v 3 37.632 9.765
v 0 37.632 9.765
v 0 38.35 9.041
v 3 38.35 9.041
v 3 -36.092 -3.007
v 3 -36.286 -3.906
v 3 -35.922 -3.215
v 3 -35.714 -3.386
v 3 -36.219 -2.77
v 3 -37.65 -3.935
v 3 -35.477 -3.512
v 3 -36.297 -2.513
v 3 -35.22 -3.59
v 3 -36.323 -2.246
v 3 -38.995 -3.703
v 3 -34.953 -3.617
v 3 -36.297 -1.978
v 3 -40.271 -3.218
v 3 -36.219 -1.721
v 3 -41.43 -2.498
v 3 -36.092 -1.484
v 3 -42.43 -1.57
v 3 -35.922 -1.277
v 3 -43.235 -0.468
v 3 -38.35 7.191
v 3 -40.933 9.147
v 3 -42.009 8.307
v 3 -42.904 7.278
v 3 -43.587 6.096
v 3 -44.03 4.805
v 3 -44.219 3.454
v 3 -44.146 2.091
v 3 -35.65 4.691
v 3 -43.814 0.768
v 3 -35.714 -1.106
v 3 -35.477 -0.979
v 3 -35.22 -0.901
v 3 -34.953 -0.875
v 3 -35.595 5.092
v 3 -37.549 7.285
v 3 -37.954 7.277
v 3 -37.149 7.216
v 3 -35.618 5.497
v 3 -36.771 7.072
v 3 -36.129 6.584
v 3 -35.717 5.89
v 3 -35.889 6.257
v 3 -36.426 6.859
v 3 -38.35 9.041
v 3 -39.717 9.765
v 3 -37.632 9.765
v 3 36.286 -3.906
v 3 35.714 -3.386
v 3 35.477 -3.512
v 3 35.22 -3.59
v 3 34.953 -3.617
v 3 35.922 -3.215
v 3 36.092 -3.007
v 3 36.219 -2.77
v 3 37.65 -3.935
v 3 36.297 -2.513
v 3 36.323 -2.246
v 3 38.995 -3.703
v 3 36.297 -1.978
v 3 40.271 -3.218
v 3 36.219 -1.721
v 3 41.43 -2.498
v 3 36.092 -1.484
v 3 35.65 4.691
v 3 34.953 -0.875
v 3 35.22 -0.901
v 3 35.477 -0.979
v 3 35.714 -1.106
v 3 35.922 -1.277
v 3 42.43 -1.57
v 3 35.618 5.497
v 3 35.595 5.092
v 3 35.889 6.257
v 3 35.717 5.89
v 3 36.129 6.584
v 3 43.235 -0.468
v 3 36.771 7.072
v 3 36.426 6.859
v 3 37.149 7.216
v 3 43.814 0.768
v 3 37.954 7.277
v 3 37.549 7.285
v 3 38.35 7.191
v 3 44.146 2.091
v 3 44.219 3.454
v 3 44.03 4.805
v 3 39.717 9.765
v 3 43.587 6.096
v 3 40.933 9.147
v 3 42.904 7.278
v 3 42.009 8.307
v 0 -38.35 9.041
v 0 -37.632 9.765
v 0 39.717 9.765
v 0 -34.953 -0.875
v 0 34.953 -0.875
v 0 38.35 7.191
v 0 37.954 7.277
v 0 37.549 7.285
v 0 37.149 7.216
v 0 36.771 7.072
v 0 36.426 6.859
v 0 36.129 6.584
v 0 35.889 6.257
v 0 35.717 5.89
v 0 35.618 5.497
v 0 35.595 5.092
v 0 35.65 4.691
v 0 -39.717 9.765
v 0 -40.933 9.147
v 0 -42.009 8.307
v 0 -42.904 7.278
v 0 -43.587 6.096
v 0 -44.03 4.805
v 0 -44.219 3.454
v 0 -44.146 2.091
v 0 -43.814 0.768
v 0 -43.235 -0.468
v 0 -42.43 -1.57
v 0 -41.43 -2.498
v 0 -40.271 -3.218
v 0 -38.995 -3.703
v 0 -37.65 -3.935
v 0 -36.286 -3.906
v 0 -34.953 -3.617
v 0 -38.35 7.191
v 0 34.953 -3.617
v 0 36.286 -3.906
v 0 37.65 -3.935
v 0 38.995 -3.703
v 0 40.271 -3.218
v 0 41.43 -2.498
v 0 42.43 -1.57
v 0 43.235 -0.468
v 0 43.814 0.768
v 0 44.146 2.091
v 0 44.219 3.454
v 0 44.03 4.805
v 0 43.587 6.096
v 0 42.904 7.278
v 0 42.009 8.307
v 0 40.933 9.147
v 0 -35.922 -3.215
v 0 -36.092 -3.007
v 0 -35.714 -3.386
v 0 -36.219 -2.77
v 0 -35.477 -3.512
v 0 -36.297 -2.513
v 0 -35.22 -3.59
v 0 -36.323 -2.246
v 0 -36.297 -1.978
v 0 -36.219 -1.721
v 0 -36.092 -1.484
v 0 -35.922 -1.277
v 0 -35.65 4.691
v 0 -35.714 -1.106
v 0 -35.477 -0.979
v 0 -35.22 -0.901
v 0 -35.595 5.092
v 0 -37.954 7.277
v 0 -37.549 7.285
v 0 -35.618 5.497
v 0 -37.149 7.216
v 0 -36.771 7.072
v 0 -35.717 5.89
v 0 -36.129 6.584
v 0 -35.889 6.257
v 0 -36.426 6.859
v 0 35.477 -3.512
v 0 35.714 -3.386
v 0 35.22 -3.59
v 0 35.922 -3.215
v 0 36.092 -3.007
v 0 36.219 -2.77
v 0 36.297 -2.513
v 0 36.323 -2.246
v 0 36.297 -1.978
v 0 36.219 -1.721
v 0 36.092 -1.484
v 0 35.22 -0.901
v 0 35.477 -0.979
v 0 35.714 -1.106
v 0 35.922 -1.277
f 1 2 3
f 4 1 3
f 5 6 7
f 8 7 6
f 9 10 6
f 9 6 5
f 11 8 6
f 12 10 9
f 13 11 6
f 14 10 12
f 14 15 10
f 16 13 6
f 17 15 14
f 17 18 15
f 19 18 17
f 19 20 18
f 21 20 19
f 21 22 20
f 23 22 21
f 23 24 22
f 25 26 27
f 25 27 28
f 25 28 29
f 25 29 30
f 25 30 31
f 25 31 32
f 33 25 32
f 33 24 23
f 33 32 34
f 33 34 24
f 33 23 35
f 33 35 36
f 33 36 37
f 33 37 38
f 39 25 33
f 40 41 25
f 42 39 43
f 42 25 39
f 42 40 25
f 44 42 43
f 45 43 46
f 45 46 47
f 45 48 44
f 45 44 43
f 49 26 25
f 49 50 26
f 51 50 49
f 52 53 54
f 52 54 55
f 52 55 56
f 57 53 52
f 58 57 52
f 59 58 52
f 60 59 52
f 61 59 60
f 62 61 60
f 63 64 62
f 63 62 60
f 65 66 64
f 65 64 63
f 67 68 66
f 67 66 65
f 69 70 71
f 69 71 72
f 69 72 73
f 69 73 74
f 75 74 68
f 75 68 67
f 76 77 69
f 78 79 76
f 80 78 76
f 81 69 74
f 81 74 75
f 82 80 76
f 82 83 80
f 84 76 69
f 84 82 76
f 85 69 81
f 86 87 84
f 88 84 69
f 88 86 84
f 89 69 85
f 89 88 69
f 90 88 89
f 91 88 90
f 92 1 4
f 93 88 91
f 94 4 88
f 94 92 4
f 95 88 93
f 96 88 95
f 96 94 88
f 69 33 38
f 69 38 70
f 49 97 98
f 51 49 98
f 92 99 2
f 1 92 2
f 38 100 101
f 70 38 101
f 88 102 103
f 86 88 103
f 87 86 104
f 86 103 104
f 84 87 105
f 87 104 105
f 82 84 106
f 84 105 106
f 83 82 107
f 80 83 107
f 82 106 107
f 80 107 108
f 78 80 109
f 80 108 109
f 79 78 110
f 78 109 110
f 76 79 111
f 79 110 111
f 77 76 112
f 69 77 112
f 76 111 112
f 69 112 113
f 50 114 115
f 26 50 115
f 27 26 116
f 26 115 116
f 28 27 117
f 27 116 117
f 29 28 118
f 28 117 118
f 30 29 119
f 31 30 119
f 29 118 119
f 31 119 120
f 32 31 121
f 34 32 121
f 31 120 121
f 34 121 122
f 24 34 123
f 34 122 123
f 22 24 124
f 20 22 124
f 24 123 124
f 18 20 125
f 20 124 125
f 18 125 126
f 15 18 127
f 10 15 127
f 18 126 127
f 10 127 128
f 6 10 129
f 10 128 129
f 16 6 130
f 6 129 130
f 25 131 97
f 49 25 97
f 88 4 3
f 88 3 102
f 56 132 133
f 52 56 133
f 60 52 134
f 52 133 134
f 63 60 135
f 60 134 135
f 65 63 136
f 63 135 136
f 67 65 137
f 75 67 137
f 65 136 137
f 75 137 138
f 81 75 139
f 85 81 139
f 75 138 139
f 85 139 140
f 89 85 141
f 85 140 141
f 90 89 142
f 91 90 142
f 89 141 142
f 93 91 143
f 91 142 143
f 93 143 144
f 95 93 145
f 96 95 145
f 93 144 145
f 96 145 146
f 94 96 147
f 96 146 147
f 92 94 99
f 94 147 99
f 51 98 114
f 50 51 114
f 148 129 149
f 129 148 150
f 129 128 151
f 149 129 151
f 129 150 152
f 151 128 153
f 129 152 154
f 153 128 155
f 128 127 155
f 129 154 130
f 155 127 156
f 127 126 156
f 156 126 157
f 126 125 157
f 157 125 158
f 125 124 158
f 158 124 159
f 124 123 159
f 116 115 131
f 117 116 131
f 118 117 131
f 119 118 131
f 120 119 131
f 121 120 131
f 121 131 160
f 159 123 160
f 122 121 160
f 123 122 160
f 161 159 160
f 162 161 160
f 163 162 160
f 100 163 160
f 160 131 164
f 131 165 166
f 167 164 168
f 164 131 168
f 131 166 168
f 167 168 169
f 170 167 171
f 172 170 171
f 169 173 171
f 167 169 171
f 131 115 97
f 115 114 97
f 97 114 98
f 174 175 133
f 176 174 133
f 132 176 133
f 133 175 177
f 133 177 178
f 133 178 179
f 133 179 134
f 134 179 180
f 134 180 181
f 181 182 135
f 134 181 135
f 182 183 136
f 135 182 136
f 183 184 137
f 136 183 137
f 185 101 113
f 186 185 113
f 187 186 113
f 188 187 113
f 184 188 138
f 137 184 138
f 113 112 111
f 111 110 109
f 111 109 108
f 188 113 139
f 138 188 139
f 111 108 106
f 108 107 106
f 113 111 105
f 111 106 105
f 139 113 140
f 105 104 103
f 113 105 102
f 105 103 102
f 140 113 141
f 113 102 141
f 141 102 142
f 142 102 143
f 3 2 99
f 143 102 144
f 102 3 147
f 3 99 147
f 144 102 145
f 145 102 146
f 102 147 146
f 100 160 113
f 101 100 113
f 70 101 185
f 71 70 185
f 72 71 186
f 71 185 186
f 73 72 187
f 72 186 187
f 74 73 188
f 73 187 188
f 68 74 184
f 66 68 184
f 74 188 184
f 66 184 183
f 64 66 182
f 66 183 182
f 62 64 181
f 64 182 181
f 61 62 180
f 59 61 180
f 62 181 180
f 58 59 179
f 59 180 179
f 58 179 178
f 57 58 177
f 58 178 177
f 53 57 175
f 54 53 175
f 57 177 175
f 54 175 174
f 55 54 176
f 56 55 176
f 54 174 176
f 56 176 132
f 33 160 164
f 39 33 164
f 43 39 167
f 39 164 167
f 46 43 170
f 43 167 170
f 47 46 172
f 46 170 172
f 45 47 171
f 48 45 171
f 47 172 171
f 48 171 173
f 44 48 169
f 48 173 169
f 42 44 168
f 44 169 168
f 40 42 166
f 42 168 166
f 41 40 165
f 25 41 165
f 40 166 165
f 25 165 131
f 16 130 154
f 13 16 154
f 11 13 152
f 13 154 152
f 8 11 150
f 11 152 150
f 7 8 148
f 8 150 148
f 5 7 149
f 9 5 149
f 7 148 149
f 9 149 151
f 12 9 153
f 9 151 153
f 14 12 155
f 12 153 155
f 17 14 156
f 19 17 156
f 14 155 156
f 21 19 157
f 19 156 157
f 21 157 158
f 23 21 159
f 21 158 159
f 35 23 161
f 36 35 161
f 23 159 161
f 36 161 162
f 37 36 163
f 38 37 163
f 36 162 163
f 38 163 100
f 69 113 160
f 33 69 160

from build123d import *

# Parameters (mm, degrees)
F1_DEPTH = 3


with BuildPart() as f1:
    # F0 (on Right) → F1 (new body)
    with BuildSketch(Plane.YZ):
        with BuildLine():
            Line((-34.952577, -0.875086), (0, -0.875086))
            Line((0, -0.875086), (34.952577, -0.875086))
            ThreePointArc((34.952577, -0.875086), (36.32333, -2.245839), (34.952577, -3.616591))
            ThreePointArc((34.952577, -3.616591), (43.813866, 0.767528), (39.71675, 9.765116))
            Line((39.71675, 9.765116), (37.631799, 9.765116))
            Line((37.631799, 9.765116), (38.35, 9.040914))
            Line((38.35, 9.040914), (38.35, 7.190914))
            ThreePointArc((38.35, 7.190914), (36.270899, 6.728344), (35.65, 4.690914))
            Line((35.65, 4.690914), (0, 4.690914))
            Line((0, 4.690914), (-35.65, 4.690914))
            ThreePointArc((-35.65, 4.690914), (-36.270899, 6.728344), (-38.35, 7.190914))
            Line((-38.35, 7.190914), (-38.35, 9.040914))
            Line((-38.35, 9.040914), (-37.631799, 9.765116))
            Line((-37.631799, 9.765116), (-39.71675, 9.765116))
            ThreePointArc((-39.71675, 9.765116), (-43.813866, 0.767528), (-34.952577, -3.616591))
            ThreePointArc((-34.952577, -3.616591), (-36.32333, -2.245839), (-34.952577, -0.875086))
        make_face()
    extrude(amount=F1_DEPTH)


solid = f1.part
